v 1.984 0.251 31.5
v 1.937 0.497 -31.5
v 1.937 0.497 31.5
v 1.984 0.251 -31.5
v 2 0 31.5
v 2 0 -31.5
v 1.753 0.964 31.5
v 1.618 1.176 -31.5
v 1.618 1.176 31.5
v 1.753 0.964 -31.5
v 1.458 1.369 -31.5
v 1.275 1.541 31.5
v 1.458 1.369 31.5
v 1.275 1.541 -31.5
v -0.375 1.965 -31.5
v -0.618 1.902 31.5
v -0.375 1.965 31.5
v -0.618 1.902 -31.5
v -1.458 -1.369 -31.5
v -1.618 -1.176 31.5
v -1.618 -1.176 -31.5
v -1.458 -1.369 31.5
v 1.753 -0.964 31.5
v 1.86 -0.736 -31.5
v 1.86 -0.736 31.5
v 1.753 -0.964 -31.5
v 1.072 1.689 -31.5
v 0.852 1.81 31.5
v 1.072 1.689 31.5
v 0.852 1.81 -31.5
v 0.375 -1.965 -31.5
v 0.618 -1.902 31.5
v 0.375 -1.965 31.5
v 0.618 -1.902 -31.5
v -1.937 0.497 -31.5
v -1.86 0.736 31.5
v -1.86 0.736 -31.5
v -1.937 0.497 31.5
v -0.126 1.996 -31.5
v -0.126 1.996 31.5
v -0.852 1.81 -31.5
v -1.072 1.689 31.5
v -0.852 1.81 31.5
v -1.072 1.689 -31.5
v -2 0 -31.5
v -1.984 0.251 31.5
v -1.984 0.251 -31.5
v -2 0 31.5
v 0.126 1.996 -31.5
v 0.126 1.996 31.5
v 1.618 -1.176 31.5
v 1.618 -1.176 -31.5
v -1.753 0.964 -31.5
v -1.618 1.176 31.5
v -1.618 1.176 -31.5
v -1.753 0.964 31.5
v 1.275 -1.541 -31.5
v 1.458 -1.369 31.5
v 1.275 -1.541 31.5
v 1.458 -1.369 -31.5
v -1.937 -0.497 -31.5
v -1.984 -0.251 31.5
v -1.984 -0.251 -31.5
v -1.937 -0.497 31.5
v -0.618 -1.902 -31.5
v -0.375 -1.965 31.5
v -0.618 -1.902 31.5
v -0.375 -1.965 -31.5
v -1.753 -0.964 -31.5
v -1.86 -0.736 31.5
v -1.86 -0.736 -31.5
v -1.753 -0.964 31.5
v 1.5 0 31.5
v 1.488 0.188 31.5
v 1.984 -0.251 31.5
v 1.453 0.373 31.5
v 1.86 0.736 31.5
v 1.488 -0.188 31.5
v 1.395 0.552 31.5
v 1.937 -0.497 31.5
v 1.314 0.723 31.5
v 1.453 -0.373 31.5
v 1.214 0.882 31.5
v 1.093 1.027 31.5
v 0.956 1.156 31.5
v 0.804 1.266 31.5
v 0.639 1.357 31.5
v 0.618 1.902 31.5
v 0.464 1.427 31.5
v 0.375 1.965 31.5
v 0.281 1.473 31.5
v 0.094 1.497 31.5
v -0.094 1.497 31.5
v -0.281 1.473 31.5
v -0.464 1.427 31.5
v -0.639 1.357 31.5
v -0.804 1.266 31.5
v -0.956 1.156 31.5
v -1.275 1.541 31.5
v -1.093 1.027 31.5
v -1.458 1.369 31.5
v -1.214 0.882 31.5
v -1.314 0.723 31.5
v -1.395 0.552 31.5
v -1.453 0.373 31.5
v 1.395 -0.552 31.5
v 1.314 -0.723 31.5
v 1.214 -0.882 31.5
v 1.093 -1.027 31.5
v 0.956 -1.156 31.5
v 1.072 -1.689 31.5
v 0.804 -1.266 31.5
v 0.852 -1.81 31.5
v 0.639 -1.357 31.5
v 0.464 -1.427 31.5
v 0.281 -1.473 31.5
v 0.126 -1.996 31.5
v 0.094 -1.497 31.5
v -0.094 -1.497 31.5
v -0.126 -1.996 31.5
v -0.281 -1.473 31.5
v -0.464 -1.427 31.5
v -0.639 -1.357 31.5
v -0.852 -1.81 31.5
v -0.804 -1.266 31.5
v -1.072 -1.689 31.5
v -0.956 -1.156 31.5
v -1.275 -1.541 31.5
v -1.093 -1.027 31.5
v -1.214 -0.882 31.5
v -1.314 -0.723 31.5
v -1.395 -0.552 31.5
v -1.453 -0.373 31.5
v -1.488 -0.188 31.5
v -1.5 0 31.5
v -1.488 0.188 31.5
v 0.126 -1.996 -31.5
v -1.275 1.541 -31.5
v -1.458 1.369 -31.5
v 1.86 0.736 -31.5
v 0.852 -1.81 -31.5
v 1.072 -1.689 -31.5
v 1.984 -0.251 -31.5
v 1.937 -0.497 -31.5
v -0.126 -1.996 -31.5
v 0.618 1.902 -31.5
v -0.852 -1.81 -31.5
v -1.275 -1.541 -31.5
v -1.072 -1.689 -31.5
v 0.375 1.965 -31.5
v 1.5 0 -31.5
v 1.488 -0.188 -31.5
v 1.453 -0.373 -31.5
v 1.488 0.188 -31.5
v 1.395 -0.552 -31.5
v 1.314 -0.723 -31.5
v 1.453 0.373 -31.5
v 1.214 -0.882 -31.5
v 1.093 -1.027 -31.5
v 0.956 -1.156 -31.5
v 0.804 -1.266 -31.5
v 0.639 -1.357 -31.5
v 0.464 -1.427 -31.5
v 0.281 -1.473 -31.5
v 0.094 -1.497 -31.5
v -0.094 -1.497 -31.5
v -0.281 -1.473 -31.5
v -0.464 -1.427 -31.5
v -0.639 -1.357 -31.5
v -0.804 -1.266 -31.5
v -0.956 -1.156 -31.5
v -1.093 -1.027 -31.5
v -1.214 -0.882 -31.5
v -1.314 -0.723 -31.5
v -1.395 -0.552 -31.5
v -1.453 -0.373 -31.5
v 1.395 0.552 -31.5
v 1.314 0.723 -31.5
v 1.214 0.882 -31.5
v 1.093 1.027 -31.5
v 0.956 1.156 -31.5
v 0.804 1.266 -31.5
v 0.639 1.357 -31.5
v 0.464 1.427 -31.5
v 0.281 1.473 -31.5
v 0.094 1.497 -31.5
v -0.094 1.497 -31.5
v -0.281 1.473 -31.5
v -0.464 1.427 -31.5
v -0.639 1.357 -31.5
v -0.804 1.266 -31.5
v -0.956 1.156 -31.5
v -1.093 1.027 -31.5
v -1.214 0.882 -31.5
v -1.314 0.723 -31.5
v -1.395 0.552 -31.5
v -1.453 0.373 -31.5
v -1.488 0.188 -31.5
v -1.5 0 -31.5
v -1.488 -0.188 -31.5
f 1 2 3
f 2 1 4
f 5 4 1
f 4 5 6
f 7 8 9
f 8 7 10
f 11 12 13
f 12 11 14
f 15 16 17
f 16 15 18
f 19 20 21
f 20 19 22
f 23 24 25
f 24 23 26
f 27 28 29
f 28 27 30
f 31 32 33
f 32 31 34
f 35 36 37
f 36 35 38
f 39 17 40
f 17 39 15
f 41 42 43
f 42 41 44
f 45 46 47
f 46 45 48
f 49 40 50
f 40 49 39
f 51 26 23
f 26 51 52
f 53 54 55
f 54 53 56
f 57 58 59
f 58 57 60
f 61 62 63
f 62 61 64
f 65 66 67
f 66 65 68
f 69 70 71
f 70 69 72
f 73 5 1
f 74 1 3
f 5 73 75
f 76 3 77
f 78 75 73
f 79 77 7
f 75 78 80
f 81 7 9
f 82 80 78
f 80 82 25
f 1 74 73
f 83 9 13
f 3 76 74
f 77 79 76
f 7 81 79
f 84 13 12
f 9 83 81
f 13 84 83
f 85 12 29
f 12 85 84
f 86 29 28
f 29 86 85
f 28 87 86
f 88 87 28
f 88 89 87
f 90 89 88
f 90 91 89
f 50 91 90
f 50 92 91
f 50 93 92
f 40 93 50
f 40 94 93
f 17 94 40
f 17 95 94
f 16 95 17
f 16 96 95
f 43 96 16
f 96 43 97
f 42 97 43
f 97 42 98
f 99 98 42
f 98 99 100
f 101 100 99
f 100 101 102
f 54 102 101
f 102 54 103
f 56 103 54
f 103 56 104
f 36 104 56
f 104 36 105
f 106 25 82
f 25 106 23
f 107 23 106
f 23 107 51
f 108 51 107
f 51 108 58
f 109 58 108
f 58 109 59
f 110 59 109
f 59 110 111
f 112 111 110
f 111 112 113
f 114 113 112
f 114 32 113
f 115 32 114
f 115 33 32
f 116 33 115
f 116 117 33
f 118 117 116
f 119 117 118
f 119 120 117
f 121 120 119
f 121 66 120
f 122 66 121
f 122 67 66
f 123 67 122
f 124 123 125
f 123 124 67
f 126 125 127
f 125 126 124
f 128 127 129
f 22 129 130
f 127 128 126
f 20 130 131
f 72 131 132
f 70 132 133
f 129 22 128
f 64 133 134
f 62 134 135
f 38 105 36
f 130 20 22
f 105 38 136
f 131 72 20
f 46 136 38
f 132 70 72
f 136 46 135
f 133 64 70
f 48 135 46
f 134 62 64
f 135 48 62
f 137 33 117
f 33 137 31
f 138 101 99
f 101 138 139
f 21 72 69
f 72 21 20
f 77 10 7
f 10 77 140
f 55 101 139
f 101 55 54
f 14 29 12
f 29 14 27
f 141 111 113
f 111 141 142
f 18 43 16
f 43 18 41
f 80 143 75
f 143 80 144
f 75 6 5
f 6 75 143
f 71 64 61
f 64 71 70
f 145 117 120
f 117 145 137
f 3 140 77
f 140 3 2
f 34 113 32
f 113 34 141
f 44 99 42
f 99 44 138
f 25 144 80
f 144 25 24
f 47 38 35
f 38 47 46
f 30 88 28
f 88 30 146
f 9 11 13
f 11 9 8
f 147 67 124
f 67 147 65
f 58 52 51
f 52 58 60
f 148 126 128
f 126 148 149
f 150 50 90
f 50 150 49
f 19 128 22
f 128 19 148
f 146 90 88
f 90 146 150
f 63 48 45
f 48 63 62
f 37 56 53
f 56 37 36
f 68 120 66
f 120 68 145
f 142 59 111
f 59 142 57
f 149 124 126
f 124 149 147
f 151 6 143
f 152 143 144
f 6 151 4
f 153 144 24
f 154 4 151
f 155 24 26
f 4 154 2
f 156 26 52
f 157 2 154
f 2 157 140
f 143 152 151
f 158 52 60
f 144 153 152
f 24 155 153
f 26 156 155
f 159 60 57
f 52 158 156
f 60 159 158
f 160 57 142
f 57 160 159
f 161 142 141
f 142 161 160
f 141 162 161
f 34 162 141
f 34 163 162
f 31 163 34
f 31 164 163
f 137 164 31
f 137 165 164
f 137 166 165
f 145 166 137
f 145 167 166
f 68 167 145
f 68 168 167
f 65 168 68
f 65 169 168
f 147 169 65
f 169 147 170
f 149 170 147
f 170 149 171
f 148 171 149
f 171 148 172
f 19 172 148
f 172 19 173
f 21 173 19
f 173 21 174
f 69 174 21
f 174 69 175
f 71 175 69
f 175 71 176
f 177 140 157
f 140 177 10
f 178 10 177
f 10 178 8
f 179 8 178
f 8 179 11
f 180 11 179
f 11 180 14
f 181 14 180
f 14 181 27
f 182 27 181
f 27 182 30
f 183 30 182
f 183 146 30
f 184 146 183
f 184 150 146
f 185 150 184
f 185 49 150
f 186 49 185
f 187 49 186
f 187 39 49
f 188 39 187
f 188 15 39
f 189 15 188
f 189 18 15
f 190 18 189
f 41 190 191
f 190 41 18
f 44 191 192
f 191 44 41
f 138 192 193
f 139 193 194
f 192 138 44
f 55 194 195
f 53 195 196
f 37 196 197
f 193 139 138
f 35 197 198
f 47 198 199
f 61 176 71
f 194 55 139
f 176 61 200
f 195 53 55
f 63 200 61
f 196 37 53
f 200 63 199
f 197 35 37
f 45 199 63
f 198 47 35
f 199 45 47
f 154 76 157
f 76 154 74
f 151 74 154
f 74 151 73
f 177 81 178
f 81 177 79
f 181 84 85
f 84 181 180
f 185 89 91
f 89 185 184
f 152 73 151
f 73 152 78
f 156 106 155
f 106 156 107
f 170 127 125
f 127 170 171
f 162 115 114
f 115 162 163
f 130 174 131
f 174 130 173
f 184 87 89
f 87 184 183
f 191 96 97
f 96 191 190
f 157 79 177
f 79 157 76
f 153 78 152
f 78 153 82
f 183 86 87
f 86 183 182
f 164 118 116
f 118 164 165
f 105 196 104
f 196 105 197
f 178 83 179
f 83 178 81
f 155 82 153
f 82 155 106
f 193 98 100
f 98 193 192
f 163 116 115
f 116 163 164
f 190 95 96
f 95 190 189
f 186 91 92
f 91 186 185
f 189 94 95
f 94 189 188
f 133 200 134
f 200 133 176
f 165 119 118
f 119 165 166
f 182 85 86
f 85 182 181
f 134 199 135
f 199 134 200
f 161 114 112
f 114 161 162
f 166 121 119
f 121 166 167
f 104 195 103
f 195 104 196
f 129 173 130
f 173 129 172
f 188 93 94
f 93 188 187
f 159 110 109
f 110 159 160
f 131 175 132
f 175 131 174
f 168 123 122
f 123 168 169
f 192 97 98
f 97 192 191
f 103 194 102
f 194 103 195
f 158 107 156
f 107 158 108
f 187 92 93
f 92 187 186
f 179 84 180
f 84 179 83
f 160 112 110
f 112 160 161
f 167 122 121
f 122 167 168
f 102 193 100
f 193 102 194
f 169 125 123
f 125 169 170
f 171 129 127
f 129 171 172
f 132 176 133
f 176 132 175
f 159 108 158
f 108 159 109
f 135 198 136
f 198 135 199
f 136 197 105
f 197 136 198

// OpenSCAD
$fn = 50;


difference() {
	union() {
		translate(v = [0, 0, -31.5000000000]) {
			cylinder(h = 63, r = 2.0000000000);
		}
	}
	union() {
		translate(v = [0, 0, -100.0000000000]) {
			cylinder(h = 200, r = 1.5000000000);
		}
	}
}
